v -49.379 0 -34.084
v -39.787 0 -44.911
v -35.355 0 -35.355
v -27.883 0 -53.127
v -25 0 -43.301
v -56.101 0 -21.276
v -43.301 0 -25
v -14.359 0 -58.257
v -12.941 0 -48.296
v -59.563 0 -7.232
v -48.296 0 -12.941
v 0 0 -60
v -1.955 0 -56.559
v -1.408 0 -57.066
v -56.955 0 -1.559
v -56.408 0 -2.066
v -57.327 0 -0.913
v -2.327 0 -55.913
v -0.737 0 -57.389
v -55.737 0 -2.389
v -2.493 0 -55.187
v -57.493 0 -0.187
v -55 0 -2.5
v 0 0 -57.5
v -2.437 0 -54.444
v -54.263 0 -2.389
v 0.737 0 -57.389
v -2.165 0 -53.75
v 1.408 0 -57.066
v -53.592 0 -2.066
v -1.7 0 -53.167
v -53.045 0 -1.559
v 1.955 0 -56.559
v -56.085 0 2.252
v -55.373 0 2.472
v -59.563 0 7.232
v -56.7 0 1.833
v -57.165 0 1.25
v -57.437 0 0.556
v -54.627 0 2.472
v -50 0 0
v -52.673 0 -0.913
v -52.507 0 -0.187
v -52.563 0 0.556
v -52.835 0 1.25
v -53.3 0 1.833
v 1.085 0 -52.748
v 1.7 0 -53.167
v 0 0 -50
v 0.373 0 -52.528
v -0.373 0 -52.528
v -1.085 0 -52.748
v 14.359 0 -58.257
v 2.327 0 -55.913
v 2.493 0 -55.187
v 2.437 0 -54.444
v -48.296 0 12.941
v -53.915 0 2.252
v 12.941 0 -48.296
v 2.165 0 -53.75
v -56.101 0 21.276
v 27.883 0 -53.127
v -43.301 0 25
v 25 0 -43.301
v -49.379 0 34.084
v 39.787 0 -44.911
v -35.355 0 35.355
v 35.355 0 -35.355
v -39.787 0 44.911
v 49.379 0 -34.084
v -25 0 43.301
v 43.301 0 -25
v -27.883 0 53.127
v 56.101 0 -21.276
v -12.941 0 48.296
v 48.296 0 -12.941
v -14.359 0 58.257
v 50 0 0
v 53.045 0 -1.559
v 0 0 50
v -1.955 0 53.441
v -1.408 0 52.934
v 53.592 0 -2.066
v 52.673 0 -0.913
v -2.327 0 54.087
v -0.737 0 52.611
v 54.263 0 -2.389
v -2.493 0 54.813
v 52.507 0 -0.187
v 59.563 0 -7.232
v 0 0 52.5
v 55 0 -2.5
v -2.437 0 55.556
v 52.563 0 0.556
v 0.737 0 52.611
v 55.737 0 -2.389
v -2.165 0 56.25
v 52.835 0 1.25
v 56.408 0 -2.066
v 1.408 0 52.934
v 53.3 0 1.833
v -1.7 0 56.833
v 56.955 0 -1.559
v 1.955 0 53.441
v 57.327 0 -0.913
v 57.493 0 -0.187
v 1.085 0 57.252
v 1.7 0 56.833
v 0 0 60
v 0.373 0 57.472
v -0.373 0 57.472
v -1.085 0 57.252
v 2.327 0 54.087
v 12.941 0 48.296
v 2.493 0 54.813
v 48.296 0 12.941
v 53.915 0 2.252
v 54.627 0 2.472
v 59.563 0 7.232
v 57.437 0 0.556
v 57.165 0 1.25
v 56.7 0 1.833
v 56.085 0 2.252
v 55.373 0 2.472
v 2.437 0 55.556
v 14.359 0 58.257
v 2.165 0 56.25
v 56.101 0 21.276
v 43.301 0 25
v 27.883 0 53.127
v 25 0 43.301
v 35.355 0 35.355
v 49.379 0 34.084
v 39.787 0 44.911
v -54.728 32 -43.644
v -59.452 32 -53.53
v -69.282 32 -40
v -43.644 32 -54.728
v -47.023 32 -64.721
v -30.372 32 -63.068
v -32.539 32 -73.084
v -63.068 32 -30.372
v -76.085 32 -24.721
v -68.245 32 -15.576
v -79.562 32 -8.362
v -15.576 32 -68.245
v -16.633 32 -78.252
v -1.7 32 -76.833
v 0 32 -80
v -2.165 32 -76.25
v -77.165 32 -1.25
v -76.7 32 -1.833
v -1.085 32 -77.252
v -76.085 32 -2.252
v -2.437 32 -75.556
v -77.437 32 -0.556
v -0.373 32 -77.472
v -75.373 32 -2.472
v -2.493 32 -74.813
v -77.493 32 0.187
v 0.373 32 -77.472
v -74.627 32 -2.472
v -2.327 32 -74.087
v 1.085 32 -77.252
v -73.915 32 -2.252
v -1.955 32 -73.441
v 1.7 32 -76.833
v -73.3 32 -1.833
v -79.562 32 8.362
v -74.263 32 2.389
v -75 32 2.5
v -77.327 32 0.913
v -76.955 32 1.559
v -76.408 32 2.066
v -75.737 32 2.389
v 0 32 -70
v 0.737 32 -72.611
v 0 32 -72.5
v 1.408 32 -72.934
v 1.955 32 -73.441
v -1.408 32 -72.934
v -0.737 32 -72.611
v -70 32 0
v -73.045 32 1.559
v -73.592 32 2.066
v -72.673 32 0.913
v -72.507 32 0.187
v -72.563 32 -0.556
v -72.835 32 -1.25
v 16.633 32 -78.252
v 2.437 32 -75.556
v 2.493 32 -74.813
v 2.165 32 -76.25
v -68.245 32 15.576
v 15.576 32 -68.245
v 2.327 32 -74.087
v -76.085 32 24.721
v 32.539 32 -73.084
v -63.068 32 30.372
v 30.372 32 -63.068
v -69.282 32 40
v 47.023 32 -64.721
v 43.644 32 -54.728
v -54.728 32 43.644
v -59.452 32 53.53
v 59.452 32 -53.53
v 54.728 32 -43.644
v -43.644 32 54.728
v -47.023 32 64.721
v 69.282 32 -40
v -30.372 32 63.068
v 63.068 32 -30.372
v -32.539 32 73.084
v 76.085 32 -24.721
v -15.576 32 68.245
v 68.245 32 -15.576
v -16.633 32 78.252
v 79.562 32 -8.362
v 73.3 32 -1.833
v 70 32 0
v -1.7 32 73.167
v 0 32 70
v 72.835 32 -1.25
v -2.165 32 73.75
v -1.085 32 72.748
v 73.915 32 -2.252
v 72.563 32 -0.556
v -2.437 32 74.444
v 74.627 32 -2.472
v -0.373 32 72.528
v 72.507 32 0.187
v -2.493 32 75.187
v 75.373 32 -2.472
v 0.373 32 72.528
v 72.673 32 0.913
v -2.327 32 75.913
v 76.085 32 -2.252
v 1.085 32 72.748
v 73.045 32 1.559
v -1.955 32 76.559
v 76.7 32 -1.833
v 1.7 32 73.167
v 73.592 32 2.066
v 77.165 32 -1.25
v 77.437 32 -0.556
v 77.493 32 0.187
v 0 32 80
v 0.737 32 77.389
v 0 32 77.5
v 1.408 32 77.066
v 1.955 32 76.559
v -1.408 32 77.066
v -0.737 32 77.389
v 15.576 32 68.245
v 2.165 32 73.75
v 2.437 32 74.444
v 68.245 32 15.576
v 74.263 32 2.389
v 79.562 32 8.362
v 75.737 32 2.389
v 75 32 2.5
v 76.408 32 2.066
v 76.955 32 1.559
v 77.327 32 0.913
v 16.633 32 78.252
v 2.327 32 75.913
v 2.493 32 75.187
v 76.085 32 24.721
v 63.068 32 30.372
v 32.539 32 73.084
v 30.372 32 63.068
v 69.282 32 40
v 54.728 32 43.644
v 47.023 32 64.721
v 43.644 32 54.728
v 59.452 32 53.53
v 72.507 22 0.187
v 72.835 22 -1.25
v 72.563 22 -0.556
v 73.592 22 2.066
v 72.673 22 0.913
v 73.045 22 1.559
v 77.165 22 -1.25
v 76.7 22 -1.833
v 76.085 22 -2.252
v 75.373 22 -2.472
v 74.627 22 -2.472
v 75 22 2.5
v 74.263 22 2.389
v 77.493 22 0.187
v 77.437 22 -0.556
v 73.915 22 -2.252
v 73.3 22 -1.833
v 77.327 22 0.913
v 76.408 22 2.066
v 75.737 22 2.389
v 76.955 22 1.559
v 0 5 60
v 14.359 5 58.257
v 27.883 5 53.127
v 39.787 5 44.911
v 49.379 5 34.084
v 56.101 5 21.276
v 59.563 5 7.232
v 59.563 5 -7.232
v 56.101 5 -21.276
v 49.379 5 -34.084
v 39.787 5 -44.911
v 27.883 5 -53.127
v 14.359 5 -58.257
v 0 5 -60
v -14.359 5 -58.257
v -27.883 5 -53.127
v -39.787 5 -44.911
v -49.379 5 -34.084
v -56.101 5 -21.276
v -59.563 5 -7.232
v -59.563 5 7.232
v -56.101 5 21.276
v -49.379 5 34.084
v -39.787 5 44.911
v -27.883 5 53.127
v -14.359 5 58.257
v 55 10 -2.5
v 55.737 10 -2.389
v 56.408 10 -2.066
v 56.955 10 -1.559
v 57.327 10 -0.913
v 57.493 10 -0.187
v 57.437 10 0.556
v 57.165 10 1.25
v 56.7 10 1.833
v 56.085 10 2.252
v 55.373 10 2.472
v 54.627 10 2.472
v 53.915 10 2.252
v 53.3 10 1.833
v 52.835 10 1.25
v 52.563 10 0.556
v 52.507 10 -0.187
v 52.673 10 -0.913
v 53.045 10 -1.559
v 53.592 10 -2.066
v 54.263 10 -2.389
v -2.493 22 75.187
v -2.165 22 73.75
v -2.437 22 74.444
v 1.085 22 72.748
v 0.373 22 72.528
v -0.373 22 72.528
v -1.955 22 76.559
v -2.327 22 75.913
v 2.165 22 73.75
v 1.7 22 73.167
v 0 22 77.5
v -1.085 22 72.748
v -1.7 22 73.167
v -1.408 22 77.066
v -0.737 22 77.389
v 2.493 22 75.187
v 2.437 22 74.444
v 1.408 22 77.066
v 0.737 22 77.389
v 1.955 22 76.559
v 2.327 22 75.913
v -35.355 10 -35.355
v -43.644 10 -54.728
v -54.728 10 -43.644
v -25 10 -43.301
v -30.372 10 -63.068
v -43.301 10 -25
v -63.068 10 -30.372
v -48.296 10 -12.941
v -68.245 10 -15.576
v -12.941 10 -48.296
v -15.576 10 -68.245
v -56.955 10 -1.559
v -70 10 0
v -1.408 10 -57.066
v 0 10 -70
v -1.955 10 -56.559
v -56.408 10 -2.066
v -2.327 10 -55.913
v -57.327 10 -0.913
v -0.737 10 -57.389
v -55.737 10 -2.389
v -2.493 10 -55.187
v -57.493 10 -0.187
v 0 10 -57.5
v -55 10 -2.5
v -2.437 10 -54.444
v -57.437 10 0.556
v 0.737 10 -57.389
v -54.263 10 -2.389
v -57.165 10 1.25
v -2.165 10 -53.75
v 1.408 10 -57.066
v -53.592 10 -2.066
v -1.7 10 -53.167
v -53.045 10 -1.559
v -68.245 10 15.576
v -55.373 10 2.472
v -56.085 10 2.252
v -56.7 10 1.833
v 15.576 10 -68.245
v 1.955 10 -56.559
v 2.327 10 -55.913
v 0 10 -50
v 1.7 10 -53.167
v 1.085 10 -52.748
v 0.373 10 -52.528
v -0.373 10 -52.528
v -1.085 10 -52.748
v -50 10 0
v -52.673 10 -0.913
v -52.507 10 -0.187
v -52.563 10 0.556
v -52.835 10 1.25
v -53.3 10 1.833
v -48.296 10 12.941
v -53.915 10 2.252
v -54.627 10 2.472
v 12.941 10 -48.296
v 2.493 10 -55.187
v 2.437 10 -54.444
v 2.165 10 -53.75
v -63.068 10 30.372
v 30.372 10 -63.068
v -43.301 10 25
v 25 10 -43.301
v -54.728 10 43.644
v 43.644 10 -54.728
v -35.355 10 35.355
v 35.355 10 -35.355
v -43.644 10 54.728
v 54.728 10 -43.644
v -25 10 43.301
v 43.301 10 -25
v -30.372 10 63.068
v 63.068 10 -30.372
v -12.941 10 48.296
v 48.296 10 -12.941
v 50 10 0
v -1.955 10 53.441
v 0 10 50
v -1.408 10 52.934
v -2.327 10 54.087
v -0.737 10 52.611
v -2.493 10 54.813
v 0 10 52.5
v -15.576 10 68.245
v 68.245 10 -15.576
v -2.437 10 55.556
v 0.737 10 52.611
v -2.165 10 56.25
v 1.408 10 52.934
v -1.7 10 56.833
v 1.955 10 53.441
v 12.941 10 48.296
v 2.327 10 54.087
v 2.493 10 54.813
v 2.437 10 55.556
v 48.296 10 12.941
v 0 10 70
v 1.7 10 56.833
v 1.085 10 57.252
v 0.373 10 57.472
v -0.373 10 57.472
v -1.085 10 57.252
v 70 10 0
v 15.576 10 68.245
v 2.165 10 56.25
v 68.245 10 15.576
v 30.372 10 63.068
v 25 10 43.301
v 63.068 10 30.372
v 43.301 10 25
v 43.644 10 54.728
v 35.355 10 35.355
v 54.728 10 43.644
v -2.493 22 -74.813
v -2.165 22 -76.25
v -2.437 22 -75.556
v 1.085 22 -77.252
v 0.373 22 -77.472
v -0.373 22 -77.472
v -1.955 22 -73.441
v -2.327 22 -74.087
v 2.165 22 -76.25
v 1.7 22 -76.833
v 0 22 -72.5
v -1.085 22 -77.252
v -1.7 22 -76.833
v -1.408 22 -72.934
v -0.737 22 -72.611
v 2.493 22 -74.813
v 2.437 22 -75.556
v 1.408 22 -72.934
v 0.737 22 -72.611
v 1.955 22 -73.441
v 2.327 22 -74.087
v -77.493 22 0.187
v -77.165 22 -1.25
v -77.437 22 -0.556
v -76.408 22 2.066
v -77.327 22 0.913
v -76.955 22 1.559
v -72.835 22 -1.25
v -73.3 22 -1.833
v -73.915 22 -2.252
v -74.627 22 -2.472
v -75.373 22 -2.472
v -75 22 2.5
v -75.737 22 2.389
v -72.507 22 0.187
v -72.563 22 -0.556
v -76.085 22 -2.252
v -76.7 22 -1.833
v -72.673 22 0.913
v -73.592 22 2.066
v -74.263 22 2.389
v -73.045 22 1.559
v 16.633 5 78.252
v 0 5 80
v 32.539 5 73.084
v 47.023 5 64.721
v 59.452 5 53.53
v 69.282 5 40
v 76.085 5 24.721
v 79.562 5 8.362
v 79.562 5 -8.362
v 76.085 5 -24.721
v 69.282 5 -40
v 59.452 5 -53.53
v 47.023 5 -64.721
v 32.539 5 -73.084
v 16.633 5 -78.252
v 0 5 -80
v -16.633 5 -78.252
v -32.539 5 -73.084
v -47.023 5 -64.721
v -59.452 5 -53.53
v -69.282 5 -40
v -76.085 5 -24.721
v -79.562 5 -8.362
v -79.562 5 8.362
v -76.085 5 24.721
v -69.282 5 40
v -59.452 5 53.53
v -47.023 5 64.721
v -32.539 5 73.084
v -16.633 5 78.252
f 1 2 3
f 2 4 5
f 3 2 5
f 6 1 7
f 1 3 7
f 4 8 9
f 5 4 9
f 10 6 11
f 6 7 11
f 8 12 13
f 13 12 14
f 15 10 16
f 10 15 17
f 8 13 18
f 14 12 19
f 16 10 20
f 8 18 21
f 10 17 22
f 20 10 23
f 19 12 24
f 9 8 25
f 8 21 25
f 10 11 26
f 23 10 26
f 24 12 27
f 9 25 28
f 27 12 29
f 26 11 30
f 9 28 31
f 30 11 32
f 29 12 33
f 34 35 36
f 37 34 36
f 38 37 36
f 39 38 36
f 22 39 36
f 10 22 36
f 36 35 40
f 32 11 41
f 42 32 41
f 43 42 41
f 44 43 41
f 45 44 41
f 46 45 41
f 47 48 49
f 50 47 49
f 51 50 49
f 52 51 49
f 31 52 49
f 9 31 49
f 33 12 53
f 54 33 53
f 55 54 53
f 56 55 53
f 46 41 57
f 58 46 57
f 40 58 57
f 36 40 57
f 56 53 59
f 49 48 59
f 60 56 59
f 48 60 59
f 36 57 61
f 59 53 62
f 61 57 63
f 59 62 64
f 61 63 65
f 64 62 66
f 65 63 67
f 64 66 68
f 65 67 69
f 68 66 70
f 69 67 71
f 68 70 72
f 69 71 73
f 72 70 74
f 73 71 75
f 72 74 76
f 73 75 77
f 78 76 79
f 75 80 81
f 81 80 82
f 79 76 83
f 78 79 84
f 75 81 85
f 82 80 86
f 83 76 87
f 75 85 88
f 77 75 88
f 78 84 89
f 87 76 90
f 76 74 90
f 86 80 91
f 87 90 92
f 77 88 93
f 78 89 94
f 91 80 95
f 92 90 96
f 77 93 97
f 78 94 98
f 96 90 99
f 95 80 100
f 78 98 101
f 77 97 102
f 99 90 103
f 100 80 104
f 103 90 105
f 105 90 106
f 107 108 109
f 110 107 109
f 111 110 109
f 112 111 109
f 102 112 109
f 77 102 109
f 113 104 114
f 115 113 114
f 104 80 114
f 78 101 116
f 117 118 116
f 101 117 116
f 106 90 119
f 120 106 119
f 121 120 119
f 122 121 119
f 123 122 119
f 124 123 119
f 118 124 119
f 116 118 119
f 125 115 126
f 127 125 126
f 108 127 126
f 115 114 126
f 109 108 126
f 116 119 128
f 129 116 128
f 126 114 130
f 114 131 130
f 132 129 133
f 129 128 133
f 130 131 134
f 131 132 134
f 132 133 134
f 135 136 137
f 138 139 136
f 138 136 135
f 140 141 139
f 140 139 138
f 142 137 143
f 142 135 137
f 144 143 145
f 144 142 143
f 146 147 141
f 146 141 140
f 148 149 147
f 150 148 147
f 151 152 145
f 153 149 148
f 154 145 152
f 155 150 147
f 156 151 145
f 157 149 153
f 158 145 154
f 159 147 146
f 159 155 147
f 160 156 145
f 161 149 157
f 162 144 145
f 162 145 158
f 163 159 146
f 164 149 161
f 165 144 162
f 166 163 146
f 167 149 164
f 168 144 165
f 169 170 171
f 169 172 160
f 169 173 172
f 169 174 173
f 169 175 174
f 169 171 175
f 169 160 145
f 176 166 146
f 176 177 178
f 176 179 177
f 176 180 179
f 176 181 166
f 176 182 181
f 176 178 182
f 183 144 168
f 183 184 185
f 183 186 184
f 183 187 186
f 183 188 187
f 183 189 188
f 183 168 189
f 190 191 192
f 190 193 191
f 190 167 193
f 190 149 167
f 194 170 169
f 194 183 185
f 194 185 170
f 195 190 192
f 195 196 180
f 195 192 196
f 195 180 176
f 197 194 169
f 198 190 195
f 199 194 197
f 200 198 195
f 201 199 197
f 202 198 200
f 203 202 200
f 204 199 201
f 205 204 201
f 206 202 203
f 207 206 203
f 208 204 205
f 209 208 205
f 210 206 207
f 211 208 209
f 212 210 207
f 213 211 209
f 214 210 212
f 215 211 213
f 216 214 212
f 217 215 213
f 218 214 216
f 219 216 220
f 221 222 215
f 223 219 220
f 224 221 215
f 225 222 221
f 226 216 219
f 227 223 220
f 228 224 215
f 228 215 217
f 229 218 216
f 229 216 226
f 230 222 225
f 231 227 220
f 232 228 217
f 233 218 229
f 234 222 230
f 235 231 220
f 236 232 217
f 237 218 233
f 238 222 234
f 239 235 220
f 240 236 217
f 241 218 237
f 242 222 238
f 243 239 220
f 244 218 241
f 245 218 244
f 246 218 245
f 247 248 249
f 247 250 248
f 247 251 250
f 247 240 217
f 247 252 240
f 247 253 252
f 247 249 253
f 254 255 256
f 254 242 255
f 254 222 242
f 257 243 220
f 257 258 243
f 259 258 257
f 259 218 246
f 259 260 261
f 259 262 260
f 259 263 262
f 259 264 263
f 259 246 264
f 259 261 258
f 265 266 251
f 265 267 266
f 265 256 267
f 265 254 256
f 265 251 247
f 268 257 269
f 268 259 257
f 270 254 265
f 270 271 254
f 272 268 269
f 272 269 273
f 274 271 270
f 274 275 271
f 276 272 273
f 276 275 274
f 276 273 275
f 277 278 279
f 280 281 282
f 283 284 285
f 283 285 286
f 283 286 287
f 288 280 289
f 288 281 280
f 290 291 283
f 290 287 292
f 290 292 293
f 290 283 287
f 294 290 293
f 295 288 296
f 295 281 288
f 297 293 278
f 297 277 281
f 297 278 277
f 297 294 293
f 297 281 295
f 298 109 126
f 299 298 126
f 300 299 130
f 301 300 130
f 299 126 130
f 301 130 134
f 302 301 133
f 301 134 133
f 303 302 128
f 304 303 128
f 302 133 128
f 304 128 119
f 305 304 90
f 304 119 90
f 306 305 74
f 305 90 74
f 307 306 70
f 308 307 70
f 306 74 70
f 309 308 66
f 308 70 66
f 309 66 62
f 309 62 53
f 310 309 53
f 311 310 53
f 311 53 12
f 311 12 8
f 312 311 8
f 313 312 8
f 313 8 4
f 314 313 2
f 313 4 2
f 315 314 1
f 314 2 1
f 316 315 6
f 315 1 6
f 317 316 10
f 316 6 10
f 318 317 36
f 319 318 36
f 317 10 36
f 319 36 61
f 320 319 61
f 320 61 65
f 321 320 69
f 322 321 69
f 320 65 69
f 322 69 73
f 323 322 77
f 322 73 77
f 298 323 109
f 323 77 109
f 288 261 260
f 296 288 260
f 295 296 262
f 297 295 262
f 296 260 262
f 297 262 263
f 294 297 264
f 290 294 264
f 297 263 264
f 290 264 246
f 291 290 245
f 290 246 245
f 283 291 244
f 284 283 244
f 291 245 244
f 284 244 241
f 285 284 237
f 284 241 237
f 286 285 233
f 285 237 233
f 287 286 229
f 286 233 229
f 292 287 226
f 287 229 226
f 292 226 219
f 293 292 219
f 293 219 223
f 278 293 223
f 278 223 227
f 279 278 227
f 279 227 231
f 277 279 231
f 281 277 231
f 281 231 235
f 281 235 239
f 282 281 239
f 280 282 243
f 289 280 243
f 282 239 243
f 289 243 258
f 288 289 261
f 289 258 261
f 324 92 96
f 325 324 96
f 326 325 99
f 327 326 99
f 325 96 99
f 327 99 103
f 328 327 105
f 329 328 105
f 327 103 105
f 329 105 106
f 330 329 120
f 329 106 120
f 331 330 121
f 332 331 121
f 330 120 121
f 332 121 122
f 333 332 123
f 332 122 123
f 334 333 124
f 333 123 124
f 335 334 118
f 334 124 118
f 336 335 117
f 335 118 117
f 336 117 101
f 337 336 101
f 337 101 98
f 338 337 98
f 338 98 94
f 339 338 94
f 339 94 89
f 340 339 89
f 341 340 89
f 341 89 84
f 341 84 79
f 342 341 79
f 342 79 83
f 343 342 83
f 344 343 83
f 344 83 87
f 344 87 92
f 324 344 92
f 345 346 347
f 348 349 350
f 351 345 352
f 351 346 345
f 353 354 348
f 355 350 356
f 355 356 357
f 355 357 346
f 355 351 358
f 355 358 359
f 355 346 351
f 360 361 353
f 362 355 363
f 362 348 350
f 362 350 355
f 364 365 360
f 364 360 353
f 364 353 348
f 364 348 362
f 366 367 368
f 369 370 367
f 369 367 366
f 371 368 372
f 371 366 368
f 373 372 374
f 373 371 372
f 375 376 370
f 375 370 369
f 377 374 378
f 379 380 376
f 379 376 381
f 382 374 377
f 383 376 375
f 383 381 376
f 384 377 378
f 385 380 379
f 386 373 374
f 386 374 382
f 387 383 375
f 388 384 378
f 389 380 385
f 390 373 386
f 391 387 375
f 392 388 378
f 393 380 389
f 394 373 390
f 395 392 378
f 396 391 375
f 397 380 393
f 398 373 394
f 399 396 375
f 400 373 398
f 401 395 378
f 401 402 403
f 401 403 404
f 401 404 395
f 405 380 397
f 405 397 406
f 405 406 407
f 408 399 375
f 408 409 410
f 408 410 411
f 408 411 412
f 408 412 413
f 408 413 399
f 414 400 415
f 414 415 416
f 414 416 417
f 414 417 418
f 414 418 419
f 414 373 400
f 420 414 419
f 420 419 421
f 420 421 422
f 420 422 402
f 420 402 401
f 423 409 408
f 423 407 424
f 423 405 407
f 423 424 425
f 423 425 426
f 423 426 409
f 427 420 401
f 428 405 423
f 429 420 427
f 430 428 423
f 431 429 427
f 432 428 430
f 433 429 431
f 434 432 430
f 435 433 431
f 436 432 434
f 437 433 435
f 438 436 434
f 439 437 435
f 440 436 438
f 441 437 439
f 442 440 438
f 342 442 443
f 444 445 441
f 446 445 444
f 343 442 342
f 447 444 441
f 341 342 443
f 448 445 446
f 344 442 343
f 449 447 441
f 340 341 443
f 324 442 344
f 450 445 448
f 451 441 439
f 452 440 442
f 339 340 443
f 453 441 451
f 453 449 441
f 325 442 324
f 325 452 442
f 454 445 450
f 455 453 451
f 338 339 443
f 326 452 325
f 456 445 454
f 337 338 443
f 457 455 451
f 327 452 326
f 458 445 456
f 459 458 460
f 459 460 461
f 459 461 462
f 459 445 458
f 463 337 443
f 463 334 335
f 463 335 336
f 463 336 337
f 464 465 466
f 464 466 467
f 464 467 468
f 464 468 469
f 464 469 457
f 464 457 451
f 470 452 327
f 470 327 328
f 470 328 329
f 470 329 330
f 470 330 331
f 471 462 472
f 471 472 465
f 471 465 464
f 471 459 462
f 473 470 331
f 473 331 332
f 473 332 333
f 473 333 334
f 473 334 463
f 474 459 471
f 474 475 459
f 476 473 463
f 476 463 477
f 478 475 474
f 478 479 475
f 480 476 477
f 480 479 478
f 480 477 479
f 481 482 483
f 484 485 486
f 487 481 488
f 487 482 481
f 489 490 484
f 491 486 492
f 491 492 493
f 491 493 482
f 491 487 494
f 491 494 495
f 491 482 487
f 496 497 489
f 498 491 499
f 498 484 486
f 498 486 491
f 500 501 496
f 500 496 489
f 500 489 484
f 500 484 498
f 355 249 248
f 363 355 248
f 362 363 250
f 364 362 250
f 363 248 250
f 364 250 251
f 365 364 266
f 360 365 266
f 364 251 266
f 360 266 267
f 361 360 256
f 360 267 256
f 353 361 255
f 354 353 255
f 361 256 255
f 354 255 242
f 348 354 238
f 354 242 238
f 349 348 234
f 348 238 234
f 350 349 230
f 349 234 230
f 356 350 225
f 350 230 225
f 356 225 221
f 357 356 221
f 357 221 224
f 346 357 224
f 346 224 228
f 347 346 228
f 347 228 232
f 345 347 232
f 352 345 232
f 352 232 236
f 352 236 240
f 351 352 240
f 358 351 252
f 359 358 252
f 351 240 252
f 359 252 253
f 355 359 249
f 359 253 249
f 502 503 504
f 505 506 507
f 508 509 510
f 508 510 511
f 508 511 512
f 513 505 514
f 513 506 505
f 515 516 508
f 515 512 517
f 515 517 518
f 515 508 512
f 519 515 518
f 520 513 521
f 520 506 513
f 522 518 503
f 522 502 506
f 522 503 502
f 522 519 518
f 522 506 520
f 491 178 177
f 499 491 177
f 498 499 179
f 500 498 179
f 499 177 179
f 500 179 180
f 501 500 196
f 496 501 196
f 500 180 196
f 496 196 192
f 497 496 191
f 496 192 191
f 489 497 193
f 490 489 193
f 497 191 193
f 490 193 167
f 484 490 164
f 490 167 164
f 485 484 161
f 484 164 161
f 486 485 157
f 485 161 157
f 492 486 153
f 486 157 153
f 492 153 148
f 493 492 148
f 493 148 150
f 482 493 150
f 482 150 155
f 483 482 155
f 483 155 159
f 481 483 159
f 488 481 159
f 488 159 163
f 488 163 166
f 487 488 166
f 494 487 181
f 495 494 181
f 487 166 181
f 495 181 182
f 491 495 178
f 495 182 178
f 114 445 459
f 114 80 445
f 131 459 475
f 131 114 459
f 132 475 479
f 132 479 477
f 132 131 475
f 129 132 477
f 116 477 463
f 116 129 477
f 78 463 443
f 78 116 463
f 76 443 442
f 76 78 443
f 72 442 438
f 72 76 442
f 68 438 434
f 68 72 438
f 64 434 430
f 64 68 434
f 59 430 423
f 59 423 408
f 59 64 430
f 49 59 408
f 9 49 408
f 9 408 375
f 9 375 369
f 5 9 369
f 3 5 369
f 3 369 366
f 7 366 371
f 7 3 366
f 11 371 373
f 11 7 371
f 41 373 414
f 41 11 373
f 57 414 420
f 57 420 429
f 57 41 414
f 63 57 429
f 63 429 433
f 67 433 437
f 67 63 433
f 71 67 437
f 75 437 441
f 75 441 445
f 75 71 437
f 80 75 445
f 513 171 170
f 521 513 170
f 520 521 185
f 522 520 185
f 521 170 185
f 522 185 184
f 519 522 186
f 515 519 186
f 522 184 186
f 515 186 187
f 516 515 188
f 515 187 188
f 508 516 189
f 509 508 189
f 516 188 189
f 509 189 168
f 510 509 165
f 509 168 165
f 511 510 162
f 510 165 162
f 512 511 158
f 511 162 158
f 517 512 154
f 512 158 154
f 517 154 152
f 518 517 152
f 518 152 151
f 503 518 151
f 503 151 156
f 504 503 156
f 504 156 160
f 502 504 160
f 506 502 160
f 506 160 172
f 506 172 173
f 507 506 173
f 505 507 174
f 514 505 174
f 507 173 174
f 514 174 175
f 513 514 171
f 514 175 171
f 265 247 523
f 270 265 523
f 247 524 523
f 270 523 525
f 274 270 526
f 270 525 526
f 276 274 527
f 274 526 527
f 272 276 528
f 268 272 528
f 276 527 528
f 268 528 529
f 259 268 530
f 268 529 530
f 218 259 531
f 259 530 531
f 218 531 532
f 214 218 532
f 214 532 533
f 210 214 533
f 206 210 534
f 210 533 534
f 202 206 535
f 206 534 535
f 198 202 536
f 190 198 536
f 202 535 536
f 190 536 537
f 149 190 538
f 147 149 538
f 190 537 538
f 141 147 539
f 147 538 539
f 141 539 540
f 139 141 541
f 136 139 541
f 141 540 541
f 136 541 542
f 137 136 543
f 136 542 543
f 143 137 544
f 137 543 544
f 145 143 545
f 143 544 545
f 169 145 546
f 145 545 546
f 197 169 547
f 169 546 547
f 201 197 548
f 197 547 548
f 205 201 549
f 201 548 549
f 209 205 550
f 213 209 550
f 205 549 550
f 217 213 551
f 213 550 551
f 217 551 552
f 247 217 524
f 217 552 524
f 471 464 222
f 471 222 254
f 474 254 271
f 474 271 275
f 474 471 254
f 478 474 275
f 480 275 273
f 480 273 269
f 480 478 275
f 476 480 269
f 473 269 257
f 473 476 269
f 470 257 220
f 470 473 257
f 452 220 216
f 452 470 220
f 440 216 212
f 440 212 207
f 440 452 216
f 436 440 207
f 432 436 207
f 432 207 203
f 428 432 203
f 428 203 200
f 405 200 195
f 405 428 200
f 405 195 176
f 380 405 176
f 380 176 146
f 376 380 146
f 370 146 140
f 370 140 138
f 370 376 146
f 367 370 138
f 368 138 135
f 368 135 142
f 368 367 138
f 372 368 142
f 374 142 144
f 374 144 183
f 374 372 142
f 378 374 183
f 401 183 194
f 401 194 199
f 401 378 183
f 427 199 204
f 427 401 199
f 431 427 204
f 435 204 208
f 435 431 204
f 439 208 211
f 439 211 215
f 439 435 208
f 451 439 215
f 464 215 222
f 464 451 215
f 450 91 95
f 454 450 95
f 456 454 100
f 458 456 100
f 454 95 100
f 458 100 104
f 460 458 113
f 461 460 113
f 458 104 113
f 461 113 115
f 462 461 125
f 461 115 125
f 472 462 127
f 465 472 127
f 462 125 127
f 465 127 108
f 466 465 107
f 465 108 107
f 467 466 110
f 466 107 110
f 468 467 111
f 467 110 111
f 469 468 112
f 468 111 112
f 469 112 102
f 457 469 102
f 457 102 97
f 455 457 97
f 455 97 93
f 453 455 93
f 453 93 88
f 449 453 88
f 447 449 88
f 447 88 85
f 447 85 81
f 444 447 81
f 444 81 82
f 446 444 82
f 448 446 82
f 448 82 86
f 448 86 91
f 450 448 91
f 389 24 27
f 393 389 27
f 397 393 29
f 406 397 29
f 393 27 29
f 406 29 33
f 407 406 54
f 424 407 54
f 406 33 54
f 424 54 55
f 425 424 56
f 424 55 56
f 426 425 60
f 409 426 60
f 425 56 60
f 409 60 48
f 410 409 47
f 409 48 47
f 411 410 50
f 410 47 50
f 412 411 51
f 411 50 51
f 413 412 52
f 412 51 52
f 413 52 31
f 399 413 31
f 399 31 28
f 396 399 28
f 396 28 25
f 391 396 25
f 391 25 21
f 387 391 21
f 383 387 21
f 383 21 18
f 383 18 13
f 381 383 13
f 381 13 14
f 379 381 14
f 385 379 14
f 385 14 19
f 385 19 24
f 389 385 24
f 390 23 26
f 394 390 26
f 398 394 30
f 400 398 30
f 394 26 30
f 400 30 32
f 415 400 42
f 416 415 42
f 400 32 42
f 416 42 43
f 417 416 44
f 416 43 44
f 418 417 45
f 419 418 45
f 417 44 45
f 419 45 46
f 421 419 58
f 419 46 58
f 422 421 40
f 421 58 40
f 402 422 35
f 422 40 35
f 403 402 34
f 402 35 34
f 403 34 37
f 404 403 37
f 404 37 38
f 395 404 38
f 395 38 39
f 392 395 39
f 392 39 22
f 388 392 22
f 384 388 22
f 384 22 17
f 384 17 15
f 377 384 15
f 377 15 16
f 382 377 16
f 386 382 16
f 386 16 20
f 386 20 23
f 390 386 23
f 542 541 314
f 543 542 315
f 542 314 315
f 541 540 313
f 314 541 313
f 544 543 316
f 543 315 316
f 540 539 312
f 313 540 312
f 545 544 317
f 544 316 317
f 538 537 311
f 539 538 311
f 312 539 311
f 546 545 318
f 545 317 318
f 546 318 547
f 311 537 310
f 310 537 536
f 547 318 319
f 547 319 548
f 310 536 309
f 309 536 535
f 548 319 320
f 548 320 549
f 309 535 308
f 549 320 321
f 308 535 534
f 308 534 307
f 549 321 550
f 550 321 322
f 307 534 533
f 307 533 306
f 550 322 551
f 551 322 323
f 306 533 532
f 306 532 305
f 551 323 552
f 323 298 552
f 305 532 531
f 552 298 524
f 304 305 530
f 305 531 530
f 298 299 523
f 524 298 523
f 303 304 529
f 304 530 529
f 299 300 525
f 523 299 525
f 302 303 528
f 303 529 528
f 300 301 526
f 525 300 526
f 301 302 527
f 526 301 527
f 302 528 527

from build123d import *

# Parameters (mm, degrees)
SKETCH2_R           = 60
SKETCH2_R_2         = 50
BOSS_EXTRUDE1_DEPTH = 5
SKETCH7_R           = 80
SKETCH7_R_2         = 50
BOSS_EXTRUDE2_DEPTH = 5
SKETCH8_R           = 80
SKETCH8_R_2         = 70
BOSS_EXTRUDE3_DEPTH = 22
CUT_EXTRUDE3_REACH  = 119.576
SKETCH4_R           = 2.5
SKETCH9_R           = 2.5
CUT_EXTRUDE4_DEPTH  = 10


with BuildPart() as part:
    # Sketch2 → Boss-Extrude1 (new body)
    with BuildSketch(Plane(origin=(0, 0, 0), x_dir=(1, 0, 0), z_dir=(0, 1, 0))):
        with Locations(Location((0, 0, 0), (0, 0, 270))):
            Circle(SKETCH2_R)
        with Locations(Location((0, 0, 0), (0, 0, 270))):
            Circle(SKETCH2_R_2, mode=Mode.SUBTRACT)
    extrude(amount=BOSS_EXTRUDE1_DEPTH)

    # Sketch7 → Boss-Extrude2 (add)
    with BuildSketch(Plane(origin=(0, 5, 0), x_dir=(1, 0, 0), z_dir=(0, 1, 0))):
        with Locations(Location((0, 0, 0), (0, 0, 270))):
            Circle(SKETCH7_R)
        with Locations(Location((0, 0, 0), (0, 0, 270))):
            Circle(SKETCH7_R_2, mode=Mode.SUBTRACT)
    extrude(amount=BOSS_EXTRUDE2_DEPTH)

    # Sketch8 → Boss-Extrude3 (add)
    with BuildSketch(Plane(origin=(0, 10, 0), x_dir=(1, 0, 0), z_dir=(0, 1, 0))):
        with Locations(Location((0, 0, 0), (0, 0, 270))):
            Circle(SKETCH8_R)
        with Locations(Location((0, 0, 0), (0, 0, 270))):
            Circle(SKETCH8_R_2, mode=Mode.SUBTRACT)
    extrude(amount=BOSS_EXTRUDE3_DEPTH)

    # Sketch4 → Cut-Extrude3 (cut, up to next)
    with BuildSketch(Plane.XZ, mode=Mode.PRIVATE) as cut_extrude3_sk1:
        with Locations(Location((-55, 0, 0), (0, 0, 270))):
            Circle(SKETCH4_R)
    cut_extrude3_tool1 = extrude(cut_extrude3_sk1.sketch, amount=-CUT_EXTRUDE3_REACH, mode=Mode.PRIVATE) & part.part
    # Sketch4 → Cut-Extrude3 (cut, up to next)
    with BuildSketch(Plane.XZ, mode=Mode.PRIVATE) as cut_extrude3_sk2:
        with Locations(Location((0, 55, 0), (0, 0, 270))):
            Circle(SKETCH4_R)
    cut_extrude3_tool2 = extrude(cut_extrude3_sk2.sketch, amount=-CUT_EXTRUDE3_REACH, mode=Mode.PRIVATE) & part.part
    # Sketch4 → Cut-Extrude3 (cut, up to next)
    with BuildSketch(Plane.XZ, mode=Mode.PRIVATE) as cut_extrude3_sk3:
        with Locations(Location((0, -55, 0), (0, 0, 270))):
            Circle(SKETCH4_R)
    cut_extrude3_tool3 = extrude(cut_extrude3_sk3.sketch, amount=-CUT_EXTRUDE3_REACH, mode=Mode.PRIVATE) & part.part
    # Sketch4 → Cut-Extrude3 (cut, up to next)
    with BuildSketch(Plane.XZ, mode=Mode.PRIVATE) as cut_extrude3_sk4:
        with Locations(Location((55, 0, 0), (0, 0, 270))):
            Circle(SKETCH4_R)
    cut_extrude3_tool4 = extrude(cut_extrude3_sk4.sketch, amount=-CUT_EXTRUDE3_REACH, mode=Mode.PRIVATE) & part.part
    add(cut_extrude3_tool1.solids().sort_by_distance((-55, 0, 0))[0], mode=Mode.SUBTRACT)
    add(cut_extrude3_tool2.solids().sort_by_distance((0, 0, 55))[0], mode=Mode.SUBTRACT)
    add(cut_extrude3_tool3.solids().sort_by_distance((0, 0, -55))[0], mode=Mode.SUBTRACT)
    add(cut_extrude3_tool4.solids().sort_by_distance((55, 0, 0))[0], mode=Mode.SUBTRACT)

    # Sketch9 → Cut-Extrude4 (cut)
    with BuildSketch(Plane(origin=(0, 32, 0), x_dir=(1, 0, 0), z_dir=(0, 1, 0))):
        with Locations(Location((-75, 0, 0), (0, 0, 270))):
            Circle(SKETCH9_R)
        with Locations(Location((0, 75, 0), (0, 0, 270))):
            Circle(SKETCH9_R)
        with Locations(Location((0, -75, 0), (0, 0, 270))):
            Circle(SKETCH9_R)
        with Locations(Location((75, 0, 0), (0, 0, 270))):
            Circle(SKETCH9_R)
    extrude(amount=-CUT_EXTRUDE4_DEPTH, mode=Mode.SUBTRACT)


solid = part.part
